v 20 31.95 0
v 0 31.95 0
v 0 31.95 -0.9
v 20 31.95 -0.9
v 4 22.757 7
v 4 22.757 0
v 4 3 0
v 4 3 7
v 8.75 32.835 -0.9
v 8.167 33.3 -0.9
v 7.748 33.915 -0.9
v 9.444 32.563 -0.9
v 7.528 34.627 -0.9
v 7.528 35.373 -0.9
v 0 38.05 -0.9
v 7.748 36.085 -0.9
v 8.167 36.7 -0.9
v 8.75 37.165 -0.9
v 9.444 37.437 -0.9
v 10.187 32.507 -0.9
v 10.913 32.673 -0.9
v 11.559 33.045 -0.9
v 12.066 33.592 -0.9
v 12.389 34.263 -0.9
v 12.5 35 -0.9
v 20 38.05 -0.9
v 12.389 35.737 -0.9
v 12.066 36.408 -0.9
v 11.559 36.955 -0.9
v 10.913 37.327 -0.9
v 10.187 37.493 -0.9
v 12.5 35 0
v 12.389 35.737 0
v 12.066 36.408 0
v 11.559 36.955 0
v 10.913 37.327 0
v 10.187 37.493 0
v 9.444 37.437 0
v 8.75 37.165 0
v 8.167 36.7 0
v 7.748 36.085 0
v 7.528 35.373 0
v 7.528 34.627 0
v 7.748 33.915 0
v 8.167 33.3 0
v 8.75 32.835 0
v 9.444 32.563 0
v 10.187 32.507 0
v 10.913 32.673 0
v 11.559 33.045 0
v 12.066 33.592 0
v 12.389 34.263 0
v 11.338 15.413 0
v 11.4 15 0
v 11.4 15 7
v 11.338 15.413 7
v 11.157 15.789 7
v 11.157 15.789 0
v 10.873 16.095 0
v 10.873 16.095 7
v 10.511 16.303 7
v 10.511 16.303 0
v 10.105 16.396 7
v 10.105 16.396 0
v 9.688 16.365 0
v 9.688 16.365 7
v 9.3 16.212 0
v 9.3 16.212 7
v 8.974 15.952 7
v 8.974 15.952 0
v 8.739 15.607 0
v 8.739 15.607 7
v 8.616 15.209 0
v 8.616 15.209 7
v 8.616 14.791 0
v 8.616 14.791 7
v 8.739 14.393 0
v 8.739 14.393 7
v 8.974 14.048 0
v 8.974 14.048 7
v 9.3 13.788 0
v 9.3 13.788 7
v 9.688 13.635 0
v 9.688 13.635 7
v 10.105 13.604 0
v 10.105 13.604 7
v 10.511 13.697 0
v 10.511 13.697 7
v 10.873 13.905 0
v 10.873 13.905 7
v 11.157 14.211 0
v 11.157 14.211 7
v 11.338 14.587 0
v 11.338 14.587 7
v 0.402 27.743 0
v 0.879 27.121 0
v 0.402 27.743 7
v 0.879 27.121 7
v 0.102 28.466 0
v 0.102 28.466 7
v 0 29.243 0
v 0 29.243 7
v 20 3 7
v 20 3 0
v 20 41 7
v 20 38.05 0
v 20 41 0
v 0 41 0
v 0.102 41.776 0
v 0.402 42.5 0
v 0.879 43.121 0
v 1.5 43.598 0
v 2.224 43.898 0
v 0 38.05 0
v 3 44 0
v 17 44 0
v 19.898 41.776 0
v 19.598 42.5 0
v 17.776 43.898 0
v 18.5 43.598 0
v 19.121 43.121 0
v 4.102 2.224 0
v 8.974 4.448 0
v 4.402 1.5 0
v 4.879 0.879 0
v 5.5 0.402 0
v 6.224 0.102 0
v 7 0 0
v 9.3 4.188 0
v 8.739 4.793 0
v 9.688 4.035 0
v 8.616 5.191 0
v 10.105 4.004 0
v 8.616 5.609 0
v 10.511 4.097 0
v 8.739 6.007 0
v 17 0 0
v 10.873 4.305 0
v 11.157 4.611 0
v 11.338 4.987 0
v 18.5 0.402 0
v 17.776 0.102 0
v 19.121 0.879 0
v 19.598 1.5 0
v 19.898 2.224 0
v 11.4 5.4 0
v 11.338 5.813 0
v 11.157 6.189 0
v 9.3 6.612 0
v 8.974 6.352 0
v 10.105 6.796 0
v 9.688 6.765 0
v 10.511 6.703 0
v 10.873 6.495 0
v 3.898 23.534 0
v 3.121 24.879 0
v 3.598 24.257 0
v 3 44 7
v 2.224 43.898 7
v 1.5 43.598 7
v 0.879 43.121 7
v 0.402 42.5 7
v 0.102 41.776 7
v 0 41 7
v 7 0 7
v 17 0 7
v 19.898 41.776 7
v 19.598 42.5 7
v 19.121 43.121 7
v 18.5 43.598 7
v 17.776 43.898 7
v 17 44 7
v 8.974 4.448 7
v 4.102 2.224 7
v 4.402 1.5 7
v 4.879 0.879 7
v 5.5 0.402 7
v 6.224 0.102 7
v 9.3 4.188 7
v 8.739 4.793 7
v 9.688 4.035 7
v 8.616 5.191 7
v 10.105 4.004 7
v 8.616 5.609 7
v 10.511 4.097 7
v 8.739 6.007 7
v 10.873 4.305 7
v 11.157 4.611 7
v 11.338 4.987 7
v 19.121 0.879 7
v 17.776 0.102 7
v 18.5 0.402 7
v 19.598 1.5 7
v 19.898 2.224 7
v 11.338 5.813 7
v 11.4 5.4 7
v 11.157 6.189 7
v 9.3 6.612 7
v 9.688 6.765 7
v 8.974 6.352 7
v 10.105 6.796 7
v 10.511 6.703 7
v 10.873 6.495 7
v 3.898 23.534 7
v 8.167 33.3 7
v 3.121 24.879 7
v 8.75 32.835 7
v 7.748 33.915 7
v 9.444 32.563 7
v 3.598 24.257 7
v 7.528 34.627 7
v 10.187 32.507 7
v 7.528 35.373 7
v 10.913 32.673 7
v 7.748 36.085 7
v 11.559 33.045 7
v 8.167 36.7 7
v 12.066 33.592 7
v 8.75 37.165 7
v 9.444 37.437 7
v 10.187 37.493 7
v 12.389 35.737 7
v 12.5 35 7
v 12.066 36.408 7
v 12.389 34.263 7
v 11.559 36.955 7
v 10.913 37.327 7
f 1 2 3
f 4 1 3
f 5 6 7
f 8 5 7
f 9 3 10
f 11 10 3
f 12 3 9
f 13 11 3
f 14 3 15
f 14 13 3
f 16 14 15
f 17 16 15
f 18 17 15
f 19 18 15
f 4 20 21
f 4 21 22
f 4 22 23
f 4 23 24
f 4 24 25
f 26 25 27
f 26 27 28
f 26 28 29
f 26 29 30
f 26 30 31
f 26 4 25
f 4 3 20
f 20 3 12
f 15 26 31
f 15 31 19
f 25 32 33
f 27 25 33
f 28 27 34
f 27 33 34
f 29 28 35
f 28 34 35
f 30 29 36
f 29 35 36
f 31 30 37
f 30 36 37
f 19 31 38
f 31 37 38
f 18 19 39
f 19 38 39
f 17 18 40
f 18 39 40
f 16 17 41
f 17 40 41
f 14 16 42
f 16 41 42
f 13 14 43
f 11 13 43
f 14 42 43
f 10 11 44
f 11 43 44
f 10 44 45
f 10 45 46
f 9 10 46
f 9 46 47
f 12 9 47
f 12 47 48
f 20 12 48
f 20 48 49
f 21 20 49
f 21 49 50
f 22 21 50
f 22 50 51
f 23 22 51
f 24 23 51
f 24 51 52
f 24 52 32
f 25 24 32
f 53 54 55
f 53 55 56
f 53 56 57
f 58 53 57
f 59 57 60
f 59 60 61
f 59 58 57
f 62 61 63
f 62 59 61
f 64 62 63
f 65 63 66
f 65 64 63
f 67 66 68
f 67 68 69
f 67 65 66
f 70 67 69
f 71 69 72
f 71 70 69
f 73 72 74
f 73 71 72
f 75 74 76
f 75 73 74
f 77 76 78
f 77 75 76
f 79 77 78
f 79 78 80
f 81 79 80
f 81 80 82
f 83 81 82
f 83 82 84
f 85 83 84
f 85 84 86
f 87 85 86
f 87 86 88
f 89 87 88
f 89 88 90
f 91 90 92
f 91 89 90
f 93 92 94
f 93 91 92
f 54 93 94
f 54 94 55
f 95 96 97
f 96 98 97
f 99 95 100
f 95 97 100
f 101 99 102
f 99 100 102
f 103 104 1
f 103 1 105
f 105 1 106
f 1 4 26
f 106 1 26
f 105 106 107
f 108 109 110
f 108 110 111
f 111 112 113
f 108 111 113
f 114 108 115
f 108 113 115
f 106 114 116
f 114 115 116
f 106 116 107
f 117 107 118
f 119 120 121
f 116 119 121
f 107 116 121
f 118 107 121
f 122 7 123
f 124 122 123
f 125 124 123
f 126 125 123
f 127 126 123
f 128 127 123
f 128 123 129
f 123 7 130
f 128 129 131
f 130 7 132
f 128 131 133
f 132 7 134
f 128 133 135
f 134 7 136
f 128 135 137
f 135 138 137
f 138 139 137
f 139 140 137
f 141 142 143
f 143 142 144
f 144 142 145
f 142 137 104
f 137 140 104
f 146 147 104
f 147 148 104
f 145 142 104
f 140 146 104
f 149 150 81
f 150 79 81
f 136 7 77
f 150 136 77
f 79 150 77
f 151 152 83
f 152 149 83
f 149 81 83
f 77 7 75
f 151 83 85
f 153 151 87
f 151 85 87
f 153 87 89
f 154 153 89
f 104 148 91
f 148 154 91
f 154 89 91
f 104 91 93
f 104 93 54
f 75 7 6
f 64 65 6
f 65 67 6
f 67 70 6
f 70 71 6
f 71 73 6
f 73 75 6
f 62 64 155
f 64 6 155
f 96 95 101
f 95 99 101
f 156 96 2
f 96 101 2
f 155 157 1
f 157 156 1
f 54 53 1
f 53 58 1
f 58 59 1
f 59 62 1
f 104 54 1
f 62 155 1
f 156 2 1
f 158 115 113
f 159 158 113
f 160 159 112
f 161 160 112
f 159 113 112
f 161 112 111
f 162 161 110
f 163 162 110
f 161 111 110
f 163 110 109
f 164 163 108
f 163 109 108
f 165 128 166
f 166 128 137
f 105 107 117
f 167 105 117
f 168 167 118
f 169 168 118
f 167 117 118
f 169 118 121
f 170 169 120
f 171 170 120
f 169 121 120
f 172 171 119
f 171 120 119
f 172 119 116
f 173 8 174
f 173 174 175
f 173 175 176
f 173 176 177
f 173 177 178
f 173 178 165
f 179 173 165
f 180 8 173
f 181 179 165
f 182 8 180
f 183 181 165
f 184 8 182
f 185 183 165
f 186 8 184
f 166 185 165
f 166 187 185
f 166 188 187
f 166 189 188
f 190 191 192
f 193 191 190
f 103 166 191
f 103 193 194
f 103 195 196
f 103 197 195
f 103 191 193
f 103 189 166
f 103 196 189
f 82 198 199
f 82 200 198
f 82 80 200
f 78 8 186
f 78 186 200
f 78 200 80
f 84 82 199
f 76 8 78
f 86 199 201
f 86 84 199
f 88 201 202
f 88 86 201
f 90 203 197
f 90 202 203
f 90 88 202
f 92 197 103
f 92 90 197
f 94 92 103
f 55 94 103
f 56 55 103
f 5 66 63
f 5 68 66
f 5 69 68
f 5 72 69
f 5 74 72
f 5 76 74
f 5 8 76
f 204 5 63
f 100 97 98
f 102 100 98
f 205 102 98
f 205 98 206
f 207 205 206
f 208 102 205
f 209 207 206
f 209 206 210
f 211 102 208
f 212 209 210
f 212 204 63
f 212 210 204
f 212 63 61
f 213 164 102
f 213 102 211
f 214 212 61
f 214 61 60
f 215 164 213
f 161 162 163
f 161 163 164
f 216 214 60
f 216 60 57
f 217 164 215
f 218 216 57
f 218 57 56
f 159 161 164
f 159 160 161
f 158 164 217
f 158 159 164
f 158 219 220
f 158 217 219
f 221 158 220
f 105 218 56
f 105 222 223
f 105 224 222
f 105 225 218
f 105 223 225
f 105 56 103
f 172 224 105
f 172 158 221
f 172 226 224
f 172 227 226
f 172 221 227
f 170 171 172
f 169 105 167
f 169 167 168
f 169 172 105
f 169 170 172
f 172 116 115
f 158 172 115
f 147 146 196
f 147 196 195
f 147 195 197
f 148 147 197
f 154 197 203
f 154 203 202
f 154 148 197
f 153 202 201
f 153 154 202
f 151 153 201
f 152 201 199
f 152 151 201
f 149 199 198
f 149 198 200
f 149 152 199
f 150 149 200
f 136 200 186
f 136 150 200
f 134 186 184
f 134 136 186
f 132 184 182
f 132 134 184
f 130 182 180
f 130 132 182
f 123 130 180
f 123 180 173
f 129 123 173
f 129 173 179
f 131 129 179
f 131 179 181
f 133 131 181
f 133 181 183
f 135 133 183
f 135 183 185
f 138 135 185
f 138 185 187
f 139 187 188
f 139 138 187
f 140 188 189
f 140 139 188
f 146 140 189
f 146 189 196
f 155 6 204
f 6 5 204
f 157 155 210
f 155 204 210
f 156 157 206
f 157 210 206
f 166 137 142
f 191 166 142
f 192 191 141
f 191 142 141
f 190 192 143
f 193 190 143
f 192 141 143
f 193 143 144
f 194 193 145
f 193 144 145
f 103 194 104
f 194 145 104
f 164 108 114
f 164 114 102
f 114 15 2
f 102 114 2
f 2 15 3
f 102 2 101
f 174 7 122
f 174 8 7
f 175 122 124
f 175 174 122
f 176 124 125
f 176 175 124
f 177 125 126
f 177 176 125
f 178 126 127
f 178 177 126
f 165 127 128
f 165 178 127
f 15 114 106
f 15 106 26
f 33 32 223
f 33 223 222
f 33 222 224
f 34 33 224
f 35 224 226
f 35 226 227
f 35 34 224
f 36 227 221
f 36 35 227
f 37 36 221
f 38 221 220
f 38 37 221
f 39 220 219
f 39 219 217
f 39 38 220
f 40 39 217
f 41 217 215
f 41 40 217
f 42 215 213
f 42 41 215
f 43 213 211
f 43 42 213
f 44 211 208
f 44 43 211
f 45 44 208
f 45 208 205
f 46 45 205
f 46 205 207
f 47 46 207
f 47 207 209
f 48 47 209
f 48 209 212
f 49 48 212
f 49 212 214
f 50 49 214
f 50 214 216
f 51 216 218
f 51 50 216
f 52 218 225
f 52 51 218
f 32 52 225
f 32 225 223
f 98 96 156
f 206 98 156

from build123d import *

# Parameters (mm, degrees)
SKETCH1_R           = 2.5
SKETCH1_R_2         = 1.4
BOSS_EXTRUDE1_DEPTH = 7
SKETCH2_W           = 0.9
SKETCH2_H           = 6.1
BOSS_EXTRUDE2_DEPTH = 20
CUT_EXTRUDE1_REACH  = 50.836
SKETCH3_R           = 2.5
CUT_EXTRUDE2_START  = -7
CUT_EXTRUDE2_DEPTH  = 7
FILLET1_R           = 3


with BuildPart() as part:
    # Sketch1 → Boss-Extrude1 (new body)
    with BuildSketch(Plane.XY):
        with BuildLine():
            Line((3, 0), (17, 0))
            ThreePointArc((17, 0), (19.121320344, 0.878679656), (20, 3))
            Line((20, 3), (20, 41))
            ThreePointArc((20, 41), (19.121320344, 43.121320344), (17, 44))
            Line((17, 44), (3, 44))
            ThreePointArc((3, 44), (0.878679656, 43.121320344), (0, 41))
            Line((0, 41), (0, 3))
            ThreePointArc((0, 3), (0.878679656, 0.878679656), (3, 0))
        make_face()
        with Locations((10, 35)):
            Circle(SKETCH1_R, mode=Mode.SUBTRACT)
        with Locations((10, 5.4)):
            Circle(SKETCH1_R_2, mode=Mode.SUBTRACT)
        with Locations((10, 15)):
            Circle(SKETCH1_R_2, mode=Mode.SUBTRACT)
    extrude(amount=BOSS_EXTRUDE1_DEPTH)

    # Sketch2 → Boss-Extrude2 (add)
    with BuildSketch(Plane(origin=(20, 0, 0), x_dir=(0, 0, -1), z_dir=(1, 0, 0))):
        with Locations((0.45, 35)):
            Rectangle(SKETCH2_W, SKETCH2_H)
    extrude(amount=-BOSS_EXTRUDE2_DEPTH)

    # Sketch3 → Cut-Extrude1 (cut, up to next)
    with BuildSketch(Plane.XY, mode=Mode.PRIVATE) as cut_extrude1_sk1:
        with Locations((10, 35)):
            Circle(SKETCH3_R)
    cut_extrude1_tool1 = extrude(cut_extrude1_sk1.sketch, amount=-CUT_EXTRUDE1_REACH, mode=Mode.PRIVATE) & part.part
    add(cut_extrude1_tool1.solids().sort_by_distance((10, 35, 0))[0], mode=Mode.SUBTRACT)

    # Sketch4 → Cut-Extrude2 (cut)
    with BuildSketch(Plane.XY.offset(7).offset(CUT_EXTRUDE2_START)):
        with BuildLine():
            Line((0, 28), (4, 24))
            Line((4, 24), (4, 0))
            Line((4, 0), (3, 0))
            ThreePointArc((3, 0), (0.878679656, 0.878679656), (0, 3))
            Line((0, 3), (0, 28))
        make_face()
    extrude(amount=CUT_EXTRUDE2_DEPTH, mode=Mode.SUBTRACT)

    # Fillet1
    fillet1_edges = [part.edges().sort_by_distance(p)[0] for p in [
        (0, 28, 3.5),
        (4, 24, 3.5),
        (4, 0, 3.5),
    ]]
    fillet(fillet1_edges, radius=FILLET1_R)


solid = part.part
